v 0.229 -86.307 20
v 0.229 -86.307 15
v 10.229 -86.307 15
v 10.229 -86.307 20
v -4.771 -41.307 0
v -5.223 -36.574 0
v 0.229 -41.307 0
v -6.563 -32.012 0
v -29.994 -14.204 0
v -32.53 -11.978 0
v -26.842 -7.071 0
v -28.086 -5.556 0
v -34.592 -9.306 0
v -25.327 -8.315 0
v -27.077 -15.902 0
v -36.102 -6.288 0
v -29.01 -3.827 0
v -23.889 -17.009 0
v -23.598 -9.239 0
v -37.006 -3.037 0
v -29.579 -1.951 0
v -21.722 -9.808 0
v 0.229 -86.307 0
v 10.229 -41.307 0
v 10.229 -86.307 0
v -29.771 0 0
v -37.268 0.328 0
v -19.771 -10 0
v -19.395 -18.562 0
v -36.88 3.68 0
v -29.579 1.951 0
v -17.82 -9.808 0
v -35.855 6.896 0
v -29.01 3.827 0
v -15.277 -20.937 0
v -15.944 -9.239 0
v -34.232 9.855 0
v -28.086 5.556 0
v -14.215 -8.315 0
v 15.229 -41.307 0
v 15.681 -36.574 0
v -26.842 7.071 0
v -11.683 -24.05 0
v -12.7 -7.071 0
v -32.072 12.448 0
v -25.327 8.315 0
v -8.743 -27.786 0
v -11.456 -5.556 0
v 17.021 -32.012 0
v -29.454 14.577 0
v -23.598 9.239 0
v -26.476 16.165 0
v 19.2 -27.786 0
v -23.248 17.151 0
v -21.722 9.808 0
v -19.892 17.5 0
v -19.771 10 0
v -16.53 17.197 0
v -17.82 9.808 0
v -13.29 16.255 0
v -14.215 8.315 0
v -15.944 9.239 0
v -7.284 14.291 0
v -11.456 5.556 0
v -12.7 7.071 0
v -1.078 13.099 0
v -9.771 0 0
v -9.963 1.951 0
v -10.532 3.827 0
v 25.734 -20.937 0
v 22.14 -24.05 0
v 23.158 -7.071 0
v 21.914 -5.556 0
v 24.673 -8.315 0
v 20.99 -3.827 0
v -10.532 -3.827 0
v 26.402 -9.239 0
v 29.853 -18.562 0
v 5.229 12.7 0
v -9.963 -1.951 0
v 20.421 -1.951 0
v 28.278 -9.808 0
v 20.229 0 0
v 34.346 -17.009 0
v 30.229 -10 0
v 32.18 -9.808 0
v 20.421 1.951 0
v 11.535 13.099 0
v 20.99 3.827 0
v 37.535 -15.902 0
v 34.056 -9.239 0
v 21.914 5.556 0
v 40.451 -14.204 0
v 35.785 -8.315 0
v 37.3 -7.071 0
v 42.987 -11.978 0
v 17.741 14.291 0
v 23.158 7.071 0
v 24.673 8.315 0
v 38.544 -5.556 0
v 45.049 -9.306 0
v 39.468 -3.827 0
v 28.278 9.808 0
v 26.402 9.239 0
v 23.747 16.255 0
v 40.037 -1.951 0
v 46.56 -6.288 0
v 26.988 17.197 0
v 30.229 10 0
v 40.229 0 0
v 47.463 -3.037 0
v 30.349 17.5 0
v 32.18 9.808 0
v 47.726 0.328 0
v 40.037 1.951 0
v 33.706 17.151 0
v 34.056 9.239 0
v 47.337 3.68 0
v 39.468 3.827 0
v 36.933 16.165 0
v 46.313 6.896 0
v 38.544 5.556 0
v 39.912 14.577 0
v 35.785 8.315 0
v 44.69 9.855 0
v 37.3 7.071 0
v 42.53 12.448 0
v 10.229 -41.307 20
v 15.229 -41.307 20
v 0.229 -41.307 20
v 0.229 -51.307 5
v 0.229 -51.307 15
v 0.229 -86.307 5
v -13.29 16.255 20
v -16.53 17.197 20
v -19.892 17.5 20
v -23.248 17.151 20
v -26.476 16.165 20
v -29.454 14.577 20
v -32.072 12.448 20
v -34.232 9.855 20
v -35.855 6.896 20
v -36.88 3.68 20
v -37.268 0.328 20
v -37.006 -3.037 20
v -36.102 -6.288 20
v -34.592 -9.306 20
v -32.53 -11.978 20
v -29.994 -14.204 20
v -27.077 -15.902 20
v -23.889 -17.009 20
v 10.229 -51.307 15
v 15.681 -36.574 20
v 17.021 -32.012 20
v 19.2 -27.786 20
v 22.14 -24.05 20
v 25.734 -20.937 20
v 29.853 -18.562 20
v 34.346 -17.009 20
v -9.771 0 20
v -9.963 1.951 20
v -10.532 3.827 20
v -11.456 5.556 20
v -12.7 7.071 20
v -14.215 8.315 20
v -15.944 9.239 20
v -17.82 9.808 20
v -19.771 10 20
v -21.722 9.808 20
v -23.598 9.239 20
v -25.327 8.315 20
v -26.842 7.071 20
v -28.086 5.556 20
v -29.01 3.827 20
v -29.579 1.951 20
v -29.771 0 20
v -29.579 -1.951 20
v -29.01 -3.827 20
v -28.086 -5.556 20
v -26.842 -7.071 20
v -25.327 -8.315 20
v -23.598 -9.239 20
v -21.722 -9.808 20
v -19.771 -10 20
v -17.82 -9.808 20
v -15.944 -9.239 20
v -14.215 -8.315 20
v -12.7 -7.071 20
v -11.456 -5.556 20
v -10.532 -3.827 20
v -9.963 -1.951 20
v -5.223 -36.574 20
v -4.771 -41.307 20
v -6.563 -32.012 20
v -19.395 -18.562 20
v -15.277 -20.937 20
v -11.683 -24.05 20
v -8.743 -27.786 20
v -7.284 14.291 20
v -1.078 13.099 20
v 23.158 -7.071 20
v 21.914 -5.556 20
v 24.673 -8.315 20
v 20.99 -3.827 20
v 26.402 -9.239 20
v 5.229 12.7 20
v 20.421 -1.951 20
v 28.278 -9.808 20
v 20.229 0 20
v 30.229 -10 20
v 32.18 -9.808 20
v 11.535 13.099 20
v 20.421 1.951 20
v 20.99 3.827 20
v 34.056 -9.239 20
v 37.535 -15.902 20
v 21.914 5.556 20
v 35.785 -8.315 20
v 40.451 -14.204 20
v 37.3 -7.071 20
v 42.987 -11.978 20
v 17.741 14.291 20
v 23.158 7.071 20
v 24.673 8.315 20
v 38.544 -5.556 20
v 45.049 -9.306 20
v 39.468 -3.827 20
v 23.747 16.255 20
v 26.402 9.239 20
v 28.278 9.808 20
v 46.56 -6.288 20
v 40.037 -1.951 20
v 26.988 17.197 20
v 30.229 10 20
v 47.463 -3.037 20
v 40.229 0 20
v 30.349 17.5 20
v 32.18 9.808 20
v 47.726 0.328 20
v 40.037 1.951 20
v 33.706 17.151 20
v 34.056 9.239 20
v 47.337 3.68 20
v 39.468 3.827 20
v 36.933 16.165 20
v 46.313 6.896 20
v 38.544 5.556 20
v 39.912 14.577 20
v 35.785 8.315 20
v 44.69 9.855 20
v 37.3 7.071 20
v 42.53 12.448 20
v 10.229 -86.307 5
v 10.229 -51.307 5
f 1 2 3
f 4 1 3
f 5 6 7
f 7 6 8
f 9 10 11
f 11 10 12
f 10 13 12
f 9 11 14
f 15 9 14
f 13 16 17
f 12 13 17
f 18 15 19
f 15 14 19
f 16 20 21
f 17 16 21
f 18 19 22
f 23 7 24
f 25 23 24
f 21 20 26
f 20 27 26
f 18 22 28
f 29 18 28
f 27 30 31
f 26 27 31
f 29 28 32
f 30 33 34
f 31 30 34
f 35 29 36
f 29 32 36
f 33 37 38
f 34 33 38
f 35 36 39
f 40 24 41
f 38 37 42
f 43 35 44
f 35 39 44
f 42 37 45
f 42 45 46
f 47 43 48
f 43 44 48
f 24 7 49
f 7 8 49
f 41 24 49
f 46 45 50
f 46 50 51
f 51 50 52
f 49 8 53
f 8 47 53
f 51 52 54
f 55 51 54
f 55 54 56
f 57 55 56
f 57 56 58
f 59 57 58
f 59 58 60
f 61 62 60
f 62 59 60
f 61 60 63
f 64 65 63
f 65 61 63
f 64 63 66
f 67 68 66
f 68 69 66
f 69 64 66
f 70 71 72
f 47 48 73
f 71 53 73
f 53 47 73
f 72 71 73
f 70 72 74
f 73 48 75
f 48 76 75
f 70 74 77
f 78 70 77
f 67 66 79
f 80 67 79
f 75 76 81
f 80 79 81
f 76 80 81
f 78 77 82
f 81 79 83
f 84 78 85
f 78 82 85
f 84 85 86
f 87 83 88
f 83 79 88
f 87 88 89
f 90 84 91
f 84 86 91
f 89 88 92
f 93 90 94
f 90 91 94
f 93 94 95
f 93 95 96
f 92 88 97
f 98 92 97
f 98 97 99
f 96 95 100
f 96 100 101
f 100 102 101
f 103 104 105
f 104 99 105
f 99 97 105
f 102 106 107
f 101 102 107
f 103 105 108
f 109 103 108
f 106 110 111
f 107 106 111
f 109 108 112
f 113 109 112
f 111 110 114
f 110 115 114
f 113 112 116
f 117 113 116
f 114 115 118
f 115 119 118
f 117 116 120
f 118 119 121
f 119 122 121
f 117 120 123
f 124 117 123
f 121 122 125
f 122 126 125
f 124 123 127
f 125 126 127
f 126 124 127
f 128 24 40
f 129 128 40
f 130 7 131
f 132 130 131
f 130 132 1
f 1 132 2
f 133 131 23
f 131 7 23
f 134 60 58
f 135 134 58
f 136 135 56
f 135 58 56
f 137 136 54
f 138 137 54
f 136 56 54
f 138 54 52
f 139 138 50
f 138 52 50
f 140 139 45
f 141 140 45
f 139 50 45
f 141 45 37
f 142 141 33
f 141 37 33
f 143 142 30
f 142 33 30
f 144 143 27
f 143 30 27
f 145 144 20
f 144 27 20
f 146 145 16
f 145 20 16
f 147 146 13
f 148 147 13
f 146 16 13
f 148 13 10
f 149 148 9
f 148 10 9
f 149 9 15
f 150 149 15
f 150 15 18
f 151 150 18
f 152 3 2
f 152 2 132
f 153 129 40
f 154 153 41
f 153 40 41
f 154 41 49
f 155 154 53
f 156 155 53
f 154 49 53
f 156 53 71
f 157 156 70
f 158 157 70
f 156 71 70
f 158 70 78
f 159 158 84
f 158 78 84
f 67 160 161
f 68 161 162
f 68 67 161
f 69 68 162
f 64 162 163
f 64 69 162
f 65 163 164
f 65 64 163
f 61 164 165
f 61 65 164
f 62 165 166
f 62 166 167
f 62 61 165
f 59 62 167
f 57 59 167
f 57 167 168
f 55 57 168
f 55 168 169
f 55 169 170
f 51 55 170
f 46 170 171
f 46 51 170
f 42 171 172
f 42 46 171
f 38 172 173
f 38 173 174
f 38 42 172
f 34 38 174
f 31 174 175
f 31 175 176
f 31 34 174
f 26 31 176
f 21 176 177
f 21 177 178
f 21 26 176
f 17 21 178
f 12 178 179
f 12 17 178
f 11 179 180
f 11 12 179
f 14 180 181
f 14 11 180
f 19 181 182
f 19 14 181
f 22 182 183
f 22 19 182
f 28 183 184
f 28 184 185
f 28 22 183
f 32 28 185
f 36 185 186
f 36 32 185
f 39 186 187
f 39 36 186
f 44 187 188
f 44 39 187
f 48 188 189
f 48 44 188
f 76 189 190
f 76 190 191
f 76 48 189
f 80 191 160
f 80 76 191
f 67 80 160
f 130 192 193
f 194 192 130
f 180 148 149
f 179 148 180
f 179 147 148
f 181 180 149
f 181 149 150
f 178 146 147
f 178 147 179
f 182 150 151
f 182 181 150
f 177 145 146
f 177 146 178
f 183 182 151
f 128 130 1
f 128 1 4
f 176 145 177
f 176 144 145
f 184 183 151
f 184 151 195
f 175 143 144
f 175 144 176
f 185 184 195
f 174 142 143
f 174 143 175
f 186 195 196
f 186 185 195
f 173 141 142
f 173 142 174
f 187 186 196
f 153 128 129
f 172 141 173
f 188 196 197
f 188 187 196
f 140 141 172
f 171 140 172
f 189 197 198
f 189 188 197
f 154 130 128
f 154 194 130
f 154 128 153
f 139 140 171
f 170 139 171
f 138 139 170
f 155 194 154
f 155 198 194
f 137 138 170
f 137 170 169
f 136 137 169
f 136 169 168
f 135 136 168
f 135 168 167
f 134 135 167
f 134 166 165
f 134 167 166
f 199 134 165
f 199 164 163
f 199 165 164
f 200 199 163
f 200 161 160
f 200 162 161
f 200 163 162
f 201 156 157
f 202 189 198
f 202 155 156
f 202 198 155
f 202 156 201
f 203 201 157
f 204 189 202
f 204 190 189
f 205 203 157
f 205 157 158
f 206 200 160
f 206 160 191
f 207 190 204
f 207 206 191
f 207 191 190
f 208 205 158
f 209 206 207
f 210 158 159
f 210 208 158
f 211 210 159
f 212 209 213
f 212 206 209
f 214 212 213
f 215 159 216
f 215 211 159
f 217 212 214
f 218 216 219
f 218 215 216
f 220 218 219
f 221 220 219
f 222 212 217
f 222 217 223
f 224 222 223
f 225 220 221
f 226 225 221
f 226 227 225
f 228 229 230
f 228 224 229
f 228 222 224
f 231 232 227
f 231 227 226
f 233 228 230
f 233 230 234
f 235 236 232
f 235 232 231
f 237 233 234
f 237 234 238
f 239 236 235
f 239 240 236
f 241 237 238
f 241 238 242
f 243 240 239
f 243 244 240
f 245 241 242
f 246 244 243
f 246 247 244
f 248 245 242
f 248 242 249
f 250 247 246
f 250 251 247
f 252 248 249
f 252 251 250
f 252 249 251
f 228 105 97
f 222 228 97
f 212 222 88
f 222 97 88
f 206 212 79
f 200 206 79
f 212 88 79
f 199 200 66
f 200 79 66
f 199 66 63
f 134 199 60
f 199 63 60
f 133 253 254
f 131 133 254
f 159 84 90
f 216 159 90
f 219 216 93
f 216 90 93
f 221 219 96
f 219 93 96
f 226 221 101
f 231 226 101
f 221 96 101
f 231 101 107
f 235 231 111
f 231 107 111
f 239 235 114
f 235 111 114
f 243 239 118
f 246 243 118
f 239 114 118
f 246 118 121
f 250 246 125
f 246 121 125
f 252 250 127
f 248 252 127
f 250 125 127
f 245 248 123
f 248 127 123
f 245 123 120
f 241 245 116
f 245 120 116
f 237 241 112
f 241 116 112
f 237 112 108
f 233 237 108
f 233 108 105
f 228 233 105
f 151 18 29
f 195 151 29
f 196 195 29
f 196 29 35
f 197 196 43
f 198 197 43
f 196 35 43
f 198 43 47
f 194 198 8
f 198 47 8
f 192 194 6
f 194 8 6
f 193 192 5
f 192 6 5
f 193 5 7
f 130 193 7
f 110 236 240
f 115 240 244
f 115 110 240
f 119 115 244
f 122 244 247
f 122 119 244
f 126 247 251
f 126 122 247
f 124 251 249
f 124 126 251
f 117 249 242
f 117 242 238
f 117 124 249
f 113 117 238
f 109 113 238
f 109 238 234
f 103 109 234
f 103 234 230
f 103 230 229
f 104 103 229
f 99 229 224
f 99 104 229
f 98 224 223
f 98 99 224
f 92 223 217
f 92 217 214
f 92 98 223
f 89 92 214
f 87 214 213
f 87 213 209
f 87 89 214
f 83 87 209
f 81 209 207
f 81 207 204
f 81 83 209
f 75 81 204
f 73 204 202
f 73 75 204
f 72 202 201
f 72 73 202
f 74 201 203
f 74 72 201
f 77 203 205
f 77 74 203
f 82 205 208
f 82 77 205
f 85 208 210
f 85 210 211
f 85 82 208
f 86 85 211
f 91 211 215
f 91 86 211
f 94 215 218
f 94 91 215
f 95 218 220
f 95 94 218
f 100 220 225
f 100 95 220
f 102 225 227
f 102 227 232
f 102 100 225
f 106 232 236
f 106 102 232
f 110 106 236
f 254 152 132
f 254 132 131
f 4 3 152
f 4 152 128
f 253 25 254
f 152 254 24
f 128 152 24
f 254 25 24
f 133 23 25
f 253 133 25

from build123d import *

# Parameters (mm, degrees)
SKETCH1_R           = 10
BOSS_EXTRUDE1_DEPTH = 20
SKETCH2_W           = 10
SKETCH2_H           = 35
CUT_EXTRUDE1_DEPTH  = 20


with BuildPart() as part:
    # Sketch1 → Boss-Extrude1 (new body)
    with BuildSketch(Plane.XY):
        with BuildLine():
            Line((-4.771193235, -41.306779105), (0.228806765, -41.306779105))
            Line((0.228806765, -41.306779105), (0.228806765, -86.306779105))
            Line((0.228806765, -86.306779105), (10.228806765, -86.306779105))
            Line((10.228806765, -86.306779105), (10.228806765, -41.306779105))
            Line((10.228806765, -41.306779105), (15.228806765, -41.306779105))
            ThreePointArc((15.228806765, -41.306779105), (20.581175565, -25.848105545), (34.346453824, -17.008673749))
            ThreePointArc((34.346453824, -17.008673749), (46.902822198, 5.31292851), (23.747325283, 16.255472857))
            ThreePointArc((23.747325283, 16.255472857), (5.228806765, 12.69968102), (-13.289711754, 16.255472857))
            ThreePointArc((-13.289711754, 16.255472857), (-36.445208668, 5.31292851), (-23.888840294, -17.008673749))
            ThreePointArc((-23.888840294, -17.008673749), (-10.123562035, -25.848105545), (-4.771193235, -41.306779105))
        make_face()
        with Locations((-19.771193235, 0)):
            Circle(SKETCH1_R, mode=Mode.SUBTRACT)
        with Locations((30.228806765, 0)):
            Circle(SKETCH1_R, mode=Mode.SUBTRACT)
    extrude(amount=BOSS_EXTRUDE1_DEPTH)

    # Sketch2 → Cut-Extrude1 (cut)
    with BuildSketch(Plane(origin=(10.228806765, 0, 0), x_dir=(0, 0, -1), z_dir=(1, 0, 0))):
        with Locations((-10, -68.806779105)):
            Rectangle(SKETCH2_W, SKETCH2_H)
    extrude(amount=-CUT_EXTRUDE1_DEPTH, mode=Mode.SUBTRACT)


solid = part.part
